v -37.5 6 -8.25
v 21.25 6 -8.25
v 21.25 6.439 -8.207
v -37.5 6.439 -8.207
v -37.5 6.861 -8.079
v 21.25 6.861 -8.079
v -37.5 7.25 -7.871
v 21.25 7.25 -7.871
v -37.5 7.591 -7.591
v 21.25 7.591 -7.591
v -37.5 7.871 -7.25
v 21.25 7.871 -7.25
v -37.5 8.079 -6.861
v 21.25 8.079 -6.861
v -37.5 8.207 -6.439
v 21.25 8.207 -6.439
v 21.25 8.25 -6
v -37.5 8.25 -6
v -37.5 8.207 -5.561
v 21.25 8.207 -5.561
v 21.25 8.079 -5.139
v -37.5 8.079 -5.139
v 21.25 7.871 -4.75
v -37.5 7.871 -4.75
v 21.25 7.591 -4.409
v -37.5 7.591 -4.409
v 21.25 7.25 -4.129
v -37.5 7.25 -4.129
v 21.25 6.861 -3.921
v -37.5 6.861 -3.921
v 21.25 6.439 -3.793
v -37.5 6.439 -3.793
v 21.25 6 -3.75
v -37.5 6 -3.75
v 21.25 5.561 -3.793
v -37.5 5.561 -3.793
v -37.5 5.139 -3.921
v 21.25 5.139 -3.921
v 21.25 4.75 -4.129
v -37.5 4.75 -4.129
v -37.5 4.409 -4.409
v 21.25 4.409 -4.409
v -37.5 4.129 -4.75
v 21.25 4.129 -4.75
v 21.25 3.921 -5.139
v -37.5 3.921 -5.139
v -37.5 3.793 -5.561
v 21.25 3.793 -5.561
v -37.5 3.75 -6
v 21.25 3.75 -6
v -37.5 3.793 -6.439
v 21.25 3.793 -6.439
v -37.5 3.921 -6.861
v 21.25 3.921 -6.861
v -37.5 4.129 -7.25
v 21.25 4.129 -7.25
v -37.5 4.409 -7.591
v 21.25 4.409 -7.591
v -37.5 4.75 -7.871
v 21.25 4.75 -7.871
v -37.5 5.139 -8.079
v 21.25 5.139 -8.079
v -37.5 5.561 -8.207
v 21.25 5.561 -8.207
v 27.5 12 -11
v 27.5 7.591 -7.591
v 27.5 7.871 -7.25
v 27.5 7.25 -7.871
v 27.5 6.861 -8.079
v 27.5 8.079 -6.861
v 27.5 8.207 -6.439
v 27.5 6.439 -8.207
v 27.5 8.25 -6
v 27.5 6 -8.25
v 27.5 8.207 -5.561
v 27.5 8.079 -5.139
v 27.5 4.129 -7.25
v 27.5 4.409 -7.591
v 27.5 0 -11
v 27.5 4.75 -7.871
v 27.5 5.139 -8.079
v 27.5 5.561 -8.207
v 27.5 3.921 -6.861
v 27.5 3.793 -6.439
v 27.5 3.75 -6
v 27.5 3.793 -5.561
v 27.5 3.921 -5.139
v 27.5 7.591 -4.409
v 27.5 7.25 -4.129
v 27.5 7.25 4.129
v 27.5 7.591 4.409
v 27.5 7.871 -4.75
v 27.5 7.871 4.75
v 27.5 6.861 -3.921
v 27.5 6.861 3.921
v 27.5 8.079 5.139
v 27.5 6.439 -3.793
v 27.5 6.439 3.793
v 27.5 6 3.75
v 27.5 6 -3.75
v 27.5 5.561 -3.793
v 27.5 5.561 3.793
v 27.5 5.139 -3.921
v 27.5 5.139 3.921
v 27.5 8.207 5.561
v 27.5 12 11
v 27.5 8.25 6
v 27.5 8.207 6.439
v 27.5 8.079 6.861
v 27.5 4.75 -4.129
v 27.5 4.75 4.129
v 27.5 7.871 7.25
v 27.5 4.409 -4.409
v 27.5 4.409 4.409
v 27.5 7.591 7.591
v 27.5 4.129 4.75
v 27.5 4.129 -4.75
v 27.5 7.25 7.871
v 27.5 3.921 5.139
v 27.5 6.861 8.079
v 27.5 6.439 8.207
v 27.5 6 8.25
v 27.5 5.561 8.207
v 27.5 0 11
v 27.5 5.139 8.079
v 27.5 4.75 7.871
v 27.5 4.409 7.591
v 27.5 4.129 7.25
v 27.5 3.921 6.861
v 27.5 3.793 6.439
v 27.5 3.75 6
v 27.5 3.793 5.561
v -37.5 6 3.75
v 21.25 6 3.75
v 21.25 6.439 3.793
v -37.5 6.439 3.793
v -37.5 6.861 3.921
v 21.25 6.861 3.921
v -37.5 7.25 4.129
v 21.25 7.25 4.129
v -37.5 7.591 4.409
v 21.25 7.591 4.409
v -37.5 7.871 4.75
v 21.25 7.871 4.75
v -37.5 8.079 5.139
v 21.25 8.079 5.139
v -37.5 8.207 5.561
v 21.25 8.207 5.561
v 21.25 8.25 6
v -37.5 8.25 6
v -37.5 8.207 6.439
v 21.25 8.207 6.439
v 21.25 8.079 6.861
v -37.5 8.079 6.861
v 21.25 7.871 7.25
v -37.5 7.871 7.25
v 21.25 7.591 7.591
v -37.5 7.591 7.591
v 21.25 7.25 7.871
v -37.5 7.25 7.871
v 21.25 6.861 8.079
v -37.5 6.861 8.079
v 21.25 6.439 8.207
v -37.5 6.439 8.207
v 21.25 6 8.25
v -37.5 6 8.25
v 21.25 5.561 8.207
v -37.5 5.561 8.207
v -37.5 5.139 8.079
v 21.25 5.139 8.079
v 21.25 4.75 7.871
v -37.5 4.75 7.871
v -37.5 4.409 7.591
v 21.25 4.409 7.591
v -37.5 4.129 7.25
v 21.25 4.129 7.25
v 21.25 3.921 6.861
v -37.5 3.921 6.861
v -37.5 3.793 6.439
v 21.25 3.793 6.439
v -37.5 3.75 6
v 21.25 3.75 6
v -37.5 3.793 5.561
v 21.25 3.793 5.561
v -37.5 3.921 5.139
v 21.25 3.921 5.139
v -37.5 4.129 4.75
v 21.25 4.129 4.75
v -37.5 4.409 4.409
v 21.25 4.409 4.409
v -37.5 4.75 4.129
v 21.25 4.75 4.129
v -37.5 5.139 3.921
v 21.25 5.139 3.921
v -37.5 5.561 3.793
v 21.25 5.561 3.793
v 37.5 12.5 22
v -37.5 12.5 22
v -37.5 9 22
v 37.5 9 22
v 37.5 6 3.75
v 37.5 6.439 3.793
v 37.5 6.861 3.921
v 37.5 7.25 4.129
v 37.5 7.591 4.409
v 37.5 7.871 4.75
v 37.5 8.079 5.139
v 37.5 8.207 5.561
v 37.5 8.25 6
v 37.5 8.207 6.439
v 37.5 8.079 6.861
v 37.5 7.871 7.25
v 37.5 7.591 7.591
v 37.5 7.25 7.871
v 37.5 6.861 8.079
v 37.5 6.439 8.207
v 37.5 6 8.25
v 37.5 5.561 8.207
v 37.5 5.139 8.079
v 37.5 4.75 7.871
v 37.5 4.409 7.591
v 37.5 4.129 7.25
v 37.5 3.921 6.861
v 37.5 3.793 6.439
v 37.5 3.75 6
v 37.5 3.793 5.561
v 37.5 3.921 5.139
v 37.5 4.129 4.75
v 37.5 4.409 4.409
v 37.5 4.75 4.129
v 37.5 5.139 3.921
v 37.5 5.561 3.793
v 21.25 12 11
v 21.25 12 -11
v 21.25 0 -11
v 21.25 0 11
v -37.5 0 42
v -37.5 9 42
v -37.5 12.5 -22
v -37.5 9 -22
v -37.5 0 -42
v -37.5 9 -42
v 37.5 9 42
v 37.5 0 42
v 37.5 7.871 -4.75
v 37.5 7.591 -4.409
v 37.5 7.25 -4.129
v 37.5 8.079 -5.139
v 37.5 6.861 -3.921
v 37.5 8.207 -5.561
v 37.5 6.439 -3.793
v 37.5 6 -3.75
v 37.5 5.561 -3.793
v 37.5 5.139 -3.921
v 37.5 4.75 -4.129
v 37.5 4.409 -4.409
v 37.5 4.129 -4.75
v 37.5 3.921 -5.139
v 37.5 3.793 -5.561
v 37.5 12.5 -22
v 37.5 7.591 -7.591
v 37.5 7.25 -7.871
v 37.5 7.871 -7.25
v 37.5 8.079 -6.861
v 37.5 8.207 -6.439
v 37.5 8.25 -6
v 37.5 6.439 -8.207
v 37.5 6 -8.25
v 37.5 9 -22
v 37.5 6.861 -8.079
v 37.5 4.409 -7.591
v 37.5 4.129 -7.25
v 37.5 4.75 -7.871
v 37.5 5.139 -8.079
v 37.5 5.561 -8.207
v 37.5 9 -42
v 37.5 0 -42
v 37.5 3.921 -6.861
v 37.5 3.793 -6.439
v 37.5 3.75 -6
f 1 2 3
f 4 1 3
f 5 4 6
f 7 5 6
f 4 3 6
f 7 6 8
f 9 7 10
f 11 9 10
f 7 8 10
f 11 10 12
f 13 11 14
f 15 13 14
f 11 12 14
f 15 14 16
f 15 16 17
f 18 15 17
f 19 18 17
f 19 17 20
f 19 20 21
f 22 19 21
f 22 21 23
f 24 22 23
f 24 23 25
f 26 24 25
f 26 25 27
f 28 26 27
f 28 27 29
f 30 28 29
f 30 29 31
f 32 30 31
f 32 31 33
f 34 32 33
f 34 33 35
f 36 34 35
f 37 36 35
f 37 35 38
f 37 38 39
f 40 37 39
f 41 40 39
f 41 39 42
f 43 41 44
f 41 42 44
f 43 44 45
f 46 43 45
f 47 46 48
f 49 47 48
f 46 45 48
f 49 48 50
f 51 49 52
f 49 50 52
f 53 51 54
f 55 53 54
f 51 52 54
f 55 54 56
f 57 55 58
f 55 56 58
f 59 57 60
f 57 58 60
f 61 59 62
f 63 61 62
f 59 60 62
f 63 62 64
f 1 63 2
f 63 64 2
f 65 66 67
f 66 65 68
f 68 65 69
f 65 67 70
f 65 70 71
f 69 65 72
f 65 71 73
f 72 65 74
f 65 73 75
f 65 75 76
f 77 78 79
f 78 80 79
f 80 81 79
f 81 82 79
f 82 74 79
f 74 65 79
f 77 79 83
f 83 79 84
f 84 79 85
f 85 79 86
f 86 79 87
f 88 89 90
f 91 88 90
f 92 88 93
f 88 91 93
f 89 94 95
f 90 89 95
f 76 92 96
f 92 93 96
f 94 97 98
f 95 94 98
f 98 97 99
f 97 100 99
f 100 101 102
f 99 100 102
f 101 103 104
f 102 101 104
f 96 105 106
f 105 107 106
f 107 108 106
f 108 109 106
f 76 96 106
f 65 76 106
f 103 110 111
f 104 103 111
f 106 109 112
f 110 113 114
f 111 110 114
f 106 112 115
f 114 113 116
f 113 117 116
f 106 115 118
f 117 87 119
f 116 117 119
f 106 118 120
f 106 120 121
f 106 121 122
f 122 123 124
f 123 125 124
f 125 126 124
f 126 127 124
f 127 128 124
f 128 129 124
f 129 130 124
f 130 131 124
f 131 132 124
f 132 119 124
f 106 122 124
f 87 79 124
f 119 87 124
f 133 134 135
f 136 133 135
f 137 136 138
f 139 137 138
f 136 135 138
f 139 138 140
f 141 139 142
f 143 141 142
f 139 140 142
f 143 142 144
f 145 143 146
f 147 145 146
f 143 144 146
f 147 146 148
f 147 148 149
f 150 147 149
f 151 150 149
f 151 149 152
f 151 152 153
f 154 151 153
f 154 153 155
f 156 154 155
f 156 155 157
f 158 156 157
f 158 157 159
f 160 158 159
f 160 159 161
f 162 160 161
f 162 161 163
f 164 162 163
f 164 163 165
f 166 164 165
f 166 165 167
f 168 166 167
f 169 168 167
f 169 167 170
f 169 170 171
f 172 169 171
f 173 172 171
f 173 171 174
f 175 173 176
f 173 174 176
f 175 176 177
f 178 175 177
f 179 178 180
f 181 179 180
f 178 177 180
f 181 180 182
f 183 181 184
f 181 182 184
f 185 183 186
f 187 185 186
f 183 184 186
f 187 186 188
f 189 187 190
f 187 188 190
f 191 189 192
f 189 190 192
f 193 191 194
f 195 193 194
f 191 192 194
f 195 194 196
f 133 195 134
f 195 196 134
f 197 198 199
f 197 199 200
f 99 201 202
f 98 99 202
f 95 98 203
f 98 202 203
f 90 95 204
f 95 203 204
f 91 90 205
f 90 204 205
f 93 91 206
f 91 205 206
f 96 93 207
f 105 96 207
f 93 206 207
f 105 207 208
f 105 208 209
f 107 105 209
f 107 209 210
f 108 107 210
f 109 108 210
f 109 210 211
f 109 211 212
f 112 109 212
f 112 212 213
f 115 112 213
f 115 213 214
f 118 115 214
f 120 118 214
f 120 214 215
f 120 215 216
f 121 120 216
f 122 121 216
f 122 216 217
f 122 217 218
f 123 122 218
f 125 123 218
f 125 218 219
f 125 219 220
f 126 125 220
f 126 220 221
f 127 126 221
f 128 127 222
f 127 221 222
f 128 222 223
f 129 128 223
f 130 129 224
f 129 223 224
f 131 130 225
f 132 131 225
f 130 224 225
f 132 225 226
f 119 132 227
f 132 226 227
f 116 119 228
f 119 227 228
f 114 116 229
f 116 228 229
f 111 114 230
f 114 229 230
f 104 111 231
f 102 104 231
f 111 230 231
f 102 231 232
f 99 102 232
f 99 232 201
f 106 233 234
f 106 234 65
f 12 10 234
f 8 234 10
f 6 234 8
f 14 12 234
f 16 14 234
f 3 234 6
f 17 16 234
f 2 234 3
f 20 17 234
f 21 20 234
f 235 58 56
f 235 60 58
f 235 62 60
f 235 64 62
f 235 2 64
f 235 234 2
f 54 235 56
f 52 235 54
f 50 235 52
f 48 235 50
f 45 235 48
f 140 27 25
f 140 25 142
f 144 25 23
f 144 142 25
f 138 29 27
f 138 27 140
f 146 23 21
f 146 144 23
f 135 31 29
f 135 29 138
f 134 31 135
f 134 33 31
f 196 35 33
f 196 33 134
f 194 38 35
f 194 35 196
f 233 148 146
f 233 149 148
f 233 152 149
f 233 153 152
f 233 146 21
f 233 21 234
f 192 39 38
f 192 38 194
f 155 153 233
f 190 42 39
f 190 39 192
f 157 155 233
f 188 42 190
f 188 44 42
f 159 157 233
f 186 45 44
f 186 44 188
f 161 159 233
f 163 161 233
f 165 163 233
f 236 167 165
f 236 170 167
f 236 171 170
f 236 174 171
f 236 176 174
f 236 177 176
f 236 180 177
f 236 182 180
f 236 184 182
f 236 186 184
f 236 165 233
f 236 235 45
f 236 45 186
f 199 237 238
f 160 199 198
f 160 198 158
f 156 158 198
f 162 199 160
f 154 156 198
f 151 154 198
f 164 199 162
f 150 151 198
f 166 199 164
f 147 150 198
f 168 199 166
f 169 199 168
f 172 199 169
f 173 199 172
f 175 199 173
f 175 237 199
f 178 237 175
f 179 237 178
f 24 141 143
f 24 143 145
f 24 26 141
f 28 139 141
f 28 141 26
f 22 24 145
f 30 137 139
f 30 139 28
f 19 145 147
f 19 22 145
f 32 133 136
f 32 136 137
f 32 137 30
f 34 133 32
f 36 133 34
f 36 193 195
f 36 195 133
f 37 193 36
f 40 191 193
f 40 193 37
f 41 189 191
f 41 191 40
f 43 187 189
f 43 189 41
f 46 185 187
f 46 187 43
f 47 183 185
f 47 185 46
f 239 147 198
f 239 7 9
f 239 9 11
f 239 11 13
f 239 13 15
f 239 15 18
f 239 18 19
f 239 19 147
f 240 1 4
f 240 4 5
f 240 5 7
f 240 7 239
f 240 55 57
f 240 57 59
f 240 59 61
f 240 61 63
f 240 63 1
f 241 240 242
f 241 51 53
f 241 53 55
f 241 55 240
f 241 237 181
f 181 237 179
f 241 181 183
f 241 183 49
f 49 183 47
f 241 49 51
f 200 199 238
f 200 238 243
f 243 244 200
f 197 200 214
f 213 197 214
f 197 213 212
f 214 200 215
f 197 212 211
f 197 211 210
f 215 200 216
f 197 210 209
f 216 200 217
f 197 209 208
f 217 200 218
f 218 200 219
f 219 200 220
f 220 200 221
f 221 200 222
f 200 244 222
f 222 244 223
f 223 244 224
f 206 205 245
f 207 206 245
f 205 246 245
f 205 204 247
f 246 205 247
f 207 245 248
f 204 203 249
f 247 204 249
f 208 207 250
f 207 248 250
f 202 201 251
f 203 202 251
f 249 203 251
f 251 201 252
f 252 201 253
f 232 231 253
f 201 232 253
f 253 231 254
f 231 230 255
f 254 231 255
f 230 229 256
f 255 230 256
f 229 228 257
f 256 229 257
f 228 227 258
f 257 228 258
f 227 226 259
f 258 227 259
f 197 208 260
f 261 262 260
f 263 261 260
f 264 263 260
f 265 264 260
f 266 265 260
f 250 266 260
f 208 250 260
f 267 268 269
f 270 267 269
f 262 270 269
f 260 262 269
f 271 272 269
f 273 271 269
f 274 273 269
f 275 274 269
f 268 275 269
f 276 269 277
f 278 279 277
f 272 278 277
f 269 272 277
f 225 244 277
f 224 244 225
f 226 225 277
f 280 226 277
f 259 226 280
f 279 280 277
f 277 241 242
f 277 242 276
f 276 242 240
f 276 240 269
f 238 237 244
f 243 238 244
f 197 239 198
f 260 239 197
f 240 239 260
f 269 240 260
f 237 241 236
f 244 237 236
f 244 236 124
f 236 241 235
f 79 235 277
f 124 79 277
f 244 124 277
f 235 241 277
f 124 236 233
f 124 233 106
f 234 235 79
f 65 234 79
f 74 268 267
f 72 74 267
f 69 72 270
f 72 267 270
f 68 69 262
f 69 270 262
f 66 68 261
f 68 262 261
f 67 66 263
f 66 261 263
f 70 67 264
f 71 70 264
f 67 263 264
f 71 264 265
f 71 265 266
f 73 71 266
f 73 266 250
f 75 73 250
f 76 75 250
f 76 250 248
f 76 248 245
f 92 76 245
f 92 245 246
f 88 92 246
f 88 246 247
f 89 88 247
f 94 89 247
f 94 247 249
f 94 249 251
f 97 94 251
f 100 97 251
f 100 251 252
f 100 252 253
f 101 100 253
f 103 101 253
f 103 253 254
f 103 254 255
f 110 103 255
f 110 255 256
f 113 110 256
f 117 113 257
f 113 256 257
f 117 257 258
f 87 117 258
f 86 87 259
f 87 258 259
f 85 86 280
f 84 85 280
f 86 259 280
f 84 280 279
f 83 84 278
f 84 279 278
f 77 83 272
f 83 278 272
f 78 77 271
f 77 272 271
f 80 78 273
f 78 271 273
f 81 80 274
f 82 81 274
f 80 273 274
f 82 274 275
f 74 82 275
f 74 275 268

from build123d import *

# Parameters (mm, degrees)
SKETCH1_W           = 75
SKETCH1_H           = 84
BOSS_EXTRUDE1_DEPTH = 12.5
SKETCH2_W           = 6.25
SKETCH2_H           = 22
CUT_EXTRUDE1_DEPTH  = 12
SKETCH3_R           = 2.25
CUT_EXTRUDE2_DEPTH  = 87.863398506
SKETCH4_W           = 75
SKETCH4_H           = 20
CUT_EXTRUDE3_DEPTH  = 3.5


with BuildPart() as part:
    # Sketch1 → Boss-Extrude1 (new body)
    with BuildSketch(Plane(origin=(0, 0, 0), x_dir=(1, 0, 0), z_dir=(0, 1, 0))):
        Rectangle(SKETCH1_W, SKETCH1_H)
    extrude(amount=BOSS_EXTRUDE1_DEPTH)

    # Sketch2 → Cut-Extrude1 (cut)
    with BuildSketch(Plane.XZ):
        with Locations((24.375, 0)):
            Rectangle(SKETCH2_W, SKETCH2_H)
    extrude(amount=-CUT_EXTRUDE1_DEPTH, mode=Mode.SUBTRACT)

    # Sketch3 → Cut-Extrude2 (cut, through all)
    with BuildSketch(Plane(origin=(37.5, 0, 0), x_dir=(0, 0, -1), z_dir=(1, 0, 0))):
        with Locations((-6, 6)):
            Circle(SKETCH3_R)
        with Locations((6, 6)):
            Circle(SKETCH3_R)
    extrude(amount=-CUT_EXTRUDE2_DEPTH, mode=Mode.SUBTRACT)

    # Sketch4 → Cut-Extrude3 (cut)
    with BuildSketch(Plane(origin=(0, 12.5, 0), x_dir=(1, 0, 0), z_dir=(0, 1, 0))):
        with Locations((0, 32)):
            Rectangle(SKETCH4_W, SKETCH4_H)
        with Locations((0, -32)):
            Rectangle(SKETCH4_W, SKETCH4_H)
    extrude(amount=-CUT_EXTRUDE3_DEPTH, mode=Mode.SUBTRACT)


solid = part.part
